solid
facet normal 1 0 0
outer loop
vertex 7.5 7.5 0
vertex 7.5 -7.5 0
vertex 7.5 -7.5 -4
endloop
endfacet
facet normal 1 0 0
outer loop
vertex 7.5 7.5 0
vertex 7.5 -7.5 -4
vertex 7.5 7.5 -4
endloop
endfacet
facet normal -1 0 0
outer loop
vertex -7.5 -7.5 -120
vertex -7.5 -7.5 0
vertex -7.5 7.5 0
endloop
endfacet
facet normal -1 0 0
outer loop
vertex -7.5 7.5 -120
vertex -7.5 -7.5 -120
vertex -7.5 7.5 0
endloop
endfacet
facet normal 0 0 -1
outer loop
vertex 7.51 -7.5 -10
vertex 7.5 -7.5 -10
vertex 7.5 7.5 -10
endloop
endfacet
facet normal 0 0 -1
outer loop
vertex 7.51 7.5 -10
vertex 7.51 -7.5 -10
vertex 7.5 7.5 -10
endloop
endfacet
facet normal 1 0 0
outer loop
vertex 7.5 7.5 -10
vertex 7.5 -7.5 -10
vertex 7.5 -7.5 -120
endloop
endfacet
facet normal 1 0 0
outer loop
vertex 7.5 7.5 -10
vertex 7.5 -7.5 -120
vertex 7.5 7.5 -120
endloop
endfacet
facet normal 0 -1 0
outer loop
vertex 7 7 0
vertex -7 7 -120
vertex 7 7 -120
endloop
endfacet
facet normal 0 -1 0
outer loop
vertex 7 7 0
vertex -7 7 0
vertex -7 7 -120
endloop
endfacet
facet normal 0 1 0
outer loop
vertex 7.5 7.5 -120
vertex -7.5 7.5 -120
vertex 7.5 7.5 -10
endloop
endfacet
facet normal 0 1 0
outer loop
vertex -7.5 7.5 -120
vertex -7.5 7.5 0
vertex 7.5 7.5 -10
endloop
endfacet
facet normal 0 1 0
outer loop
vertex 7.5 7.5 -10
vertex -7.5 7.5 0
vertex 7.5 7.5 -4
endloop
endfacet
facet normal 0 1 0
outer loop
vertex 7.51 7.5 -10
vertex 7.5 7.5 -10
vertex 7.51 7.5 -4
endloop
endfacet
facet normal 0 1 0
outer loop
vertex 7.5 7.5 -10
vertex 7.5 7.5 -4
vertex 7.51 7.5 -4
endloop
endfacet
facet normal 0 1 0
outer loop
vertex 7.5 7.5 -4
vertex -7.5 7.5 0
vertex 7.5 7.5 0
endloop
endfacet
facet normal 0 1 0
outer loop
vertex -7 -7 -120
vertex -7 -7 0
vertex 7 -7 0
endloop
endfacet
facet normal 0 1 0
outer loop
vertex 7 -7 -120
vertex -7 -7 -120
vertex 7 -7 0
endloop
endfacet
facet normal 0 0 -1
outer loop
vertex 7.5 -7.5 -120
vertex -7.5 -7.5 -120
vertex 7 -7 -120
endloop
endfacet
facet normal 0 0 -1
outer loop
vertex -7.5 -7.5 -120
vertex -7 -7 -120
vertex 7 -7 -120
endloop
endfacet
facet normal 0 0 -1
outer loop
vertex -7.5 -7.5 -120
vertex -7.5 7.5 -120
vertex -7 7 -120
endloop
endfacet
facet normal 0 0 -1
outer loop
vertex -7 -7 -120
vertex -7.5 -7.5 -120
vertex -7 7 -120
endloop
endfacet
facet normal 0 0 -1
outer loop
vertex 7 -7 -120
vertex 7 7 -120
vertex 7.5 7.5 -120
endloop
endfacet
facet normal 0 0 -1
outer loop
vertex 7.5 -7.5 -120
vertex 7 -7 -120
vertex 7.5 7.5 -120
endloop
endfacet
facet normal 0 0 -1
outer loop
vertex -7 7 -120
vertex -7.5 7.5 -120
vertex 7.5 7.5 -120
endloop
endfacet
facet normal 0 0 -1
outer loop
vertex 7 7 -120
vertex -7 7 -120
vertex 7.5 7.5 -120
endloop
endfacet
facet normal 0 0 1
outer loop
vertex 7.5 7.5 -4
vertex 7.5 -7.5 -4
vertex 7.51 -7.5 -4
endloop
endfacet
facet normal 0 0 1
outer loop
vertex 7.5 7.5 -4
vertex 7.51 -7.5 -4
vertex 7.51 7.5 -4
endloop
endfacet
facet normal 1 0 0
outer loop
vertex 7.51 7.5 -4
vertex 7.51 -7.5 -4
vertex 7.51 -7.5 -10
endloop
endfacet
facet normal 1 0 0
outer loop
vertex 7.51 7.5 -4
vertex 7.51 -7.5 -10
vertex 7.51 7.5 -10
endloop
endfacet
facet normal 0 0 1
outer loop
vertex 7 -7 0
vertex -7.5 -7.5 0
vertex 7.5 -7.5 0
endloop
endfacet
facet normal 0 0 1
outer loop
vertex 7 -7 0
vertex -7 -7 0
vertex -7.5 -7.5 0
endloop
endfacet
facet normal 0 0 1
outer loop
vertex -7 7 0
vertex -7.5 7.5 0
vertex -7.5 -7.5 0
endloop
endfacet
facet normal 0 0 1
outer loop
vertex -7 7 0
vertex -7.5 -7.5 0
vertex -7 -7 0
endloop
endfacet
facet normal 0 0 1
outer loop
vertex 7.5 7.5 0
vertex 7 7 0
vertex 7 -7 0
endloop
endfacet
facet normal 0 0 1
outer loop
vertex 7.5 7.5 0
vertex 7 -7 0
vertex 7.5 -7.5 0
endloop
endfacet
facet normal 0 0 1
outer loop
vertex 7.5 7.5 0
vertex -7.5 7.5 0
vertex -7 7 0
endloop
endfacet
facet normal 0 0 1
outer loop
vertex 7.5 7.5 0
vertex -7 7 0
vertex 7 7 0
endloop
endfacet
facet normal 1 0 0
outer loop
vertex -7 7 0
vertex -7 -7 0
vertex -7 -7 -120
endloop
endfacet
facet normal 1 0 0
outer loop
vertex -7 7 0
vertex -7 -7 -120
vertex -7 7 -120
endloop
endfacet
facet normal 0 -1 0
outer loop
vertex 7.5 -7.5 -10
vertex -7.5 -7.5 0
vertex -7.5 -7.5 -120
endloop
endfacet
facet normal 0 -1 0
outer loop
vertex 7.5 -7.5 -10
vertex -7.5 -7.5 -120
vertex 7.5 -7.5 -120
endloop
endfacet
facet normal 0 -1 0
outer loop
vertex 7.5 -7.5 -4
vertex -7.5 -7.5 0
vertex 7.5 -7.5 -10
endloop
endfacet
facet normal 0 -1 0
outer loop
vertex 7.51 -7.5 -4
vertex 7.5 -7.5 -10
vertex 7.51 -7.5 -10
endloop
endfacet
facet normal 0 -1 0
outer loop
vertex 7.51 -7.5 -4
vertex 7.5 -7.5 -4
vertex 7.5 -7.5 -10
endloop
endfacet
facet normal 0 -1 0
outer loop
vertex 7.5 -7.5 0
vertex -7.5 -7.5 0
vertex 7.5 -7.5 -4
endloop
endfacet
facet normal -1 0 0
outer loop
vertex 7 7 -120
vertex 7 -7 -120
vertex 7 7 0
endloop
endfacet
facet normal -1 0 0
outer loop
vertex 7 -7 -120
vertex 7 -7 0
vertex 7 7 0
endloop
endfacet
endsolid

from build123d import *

# Parameters (mm, degrees)
F0_W     = 15
F0_H     = 15
F0_W_2   = 14
F0_H_2   = 14
F1_DEPTH = 60
F2_W     = 15
F2_H     = 6
F3_DEPTH = 0.01
F4_DEPTH = 60


with BuildPart() as f1:
    # F0 (on Top) → F1 (new body)
    with BuildSketch(Plane.XY):
        Rectangle(F0_W, F0_H)
        Rectangle(F0_W_2, F0_H_2, mode=Mode.SUBTRACT)
    extrude(amount=-F1_DEPTH)

    # F2 (on face) → F3 (join)
    with BuildSketch(Plane.YZ.offset(7.5)):
        with Locations((0, -7)):
            Rectangle(F2_W, F2_H)
    extrude(amount=F3_DEPTH)

    # F4 (add): a face of the model
    f4_faces = [f1.faces().sort_by_distance(p)[0] for p in [
        (0, -7.2878679656, -60),
    ]]
    extrude(f4_faces, amount=F4_DEPTH)


solid = f1.part
